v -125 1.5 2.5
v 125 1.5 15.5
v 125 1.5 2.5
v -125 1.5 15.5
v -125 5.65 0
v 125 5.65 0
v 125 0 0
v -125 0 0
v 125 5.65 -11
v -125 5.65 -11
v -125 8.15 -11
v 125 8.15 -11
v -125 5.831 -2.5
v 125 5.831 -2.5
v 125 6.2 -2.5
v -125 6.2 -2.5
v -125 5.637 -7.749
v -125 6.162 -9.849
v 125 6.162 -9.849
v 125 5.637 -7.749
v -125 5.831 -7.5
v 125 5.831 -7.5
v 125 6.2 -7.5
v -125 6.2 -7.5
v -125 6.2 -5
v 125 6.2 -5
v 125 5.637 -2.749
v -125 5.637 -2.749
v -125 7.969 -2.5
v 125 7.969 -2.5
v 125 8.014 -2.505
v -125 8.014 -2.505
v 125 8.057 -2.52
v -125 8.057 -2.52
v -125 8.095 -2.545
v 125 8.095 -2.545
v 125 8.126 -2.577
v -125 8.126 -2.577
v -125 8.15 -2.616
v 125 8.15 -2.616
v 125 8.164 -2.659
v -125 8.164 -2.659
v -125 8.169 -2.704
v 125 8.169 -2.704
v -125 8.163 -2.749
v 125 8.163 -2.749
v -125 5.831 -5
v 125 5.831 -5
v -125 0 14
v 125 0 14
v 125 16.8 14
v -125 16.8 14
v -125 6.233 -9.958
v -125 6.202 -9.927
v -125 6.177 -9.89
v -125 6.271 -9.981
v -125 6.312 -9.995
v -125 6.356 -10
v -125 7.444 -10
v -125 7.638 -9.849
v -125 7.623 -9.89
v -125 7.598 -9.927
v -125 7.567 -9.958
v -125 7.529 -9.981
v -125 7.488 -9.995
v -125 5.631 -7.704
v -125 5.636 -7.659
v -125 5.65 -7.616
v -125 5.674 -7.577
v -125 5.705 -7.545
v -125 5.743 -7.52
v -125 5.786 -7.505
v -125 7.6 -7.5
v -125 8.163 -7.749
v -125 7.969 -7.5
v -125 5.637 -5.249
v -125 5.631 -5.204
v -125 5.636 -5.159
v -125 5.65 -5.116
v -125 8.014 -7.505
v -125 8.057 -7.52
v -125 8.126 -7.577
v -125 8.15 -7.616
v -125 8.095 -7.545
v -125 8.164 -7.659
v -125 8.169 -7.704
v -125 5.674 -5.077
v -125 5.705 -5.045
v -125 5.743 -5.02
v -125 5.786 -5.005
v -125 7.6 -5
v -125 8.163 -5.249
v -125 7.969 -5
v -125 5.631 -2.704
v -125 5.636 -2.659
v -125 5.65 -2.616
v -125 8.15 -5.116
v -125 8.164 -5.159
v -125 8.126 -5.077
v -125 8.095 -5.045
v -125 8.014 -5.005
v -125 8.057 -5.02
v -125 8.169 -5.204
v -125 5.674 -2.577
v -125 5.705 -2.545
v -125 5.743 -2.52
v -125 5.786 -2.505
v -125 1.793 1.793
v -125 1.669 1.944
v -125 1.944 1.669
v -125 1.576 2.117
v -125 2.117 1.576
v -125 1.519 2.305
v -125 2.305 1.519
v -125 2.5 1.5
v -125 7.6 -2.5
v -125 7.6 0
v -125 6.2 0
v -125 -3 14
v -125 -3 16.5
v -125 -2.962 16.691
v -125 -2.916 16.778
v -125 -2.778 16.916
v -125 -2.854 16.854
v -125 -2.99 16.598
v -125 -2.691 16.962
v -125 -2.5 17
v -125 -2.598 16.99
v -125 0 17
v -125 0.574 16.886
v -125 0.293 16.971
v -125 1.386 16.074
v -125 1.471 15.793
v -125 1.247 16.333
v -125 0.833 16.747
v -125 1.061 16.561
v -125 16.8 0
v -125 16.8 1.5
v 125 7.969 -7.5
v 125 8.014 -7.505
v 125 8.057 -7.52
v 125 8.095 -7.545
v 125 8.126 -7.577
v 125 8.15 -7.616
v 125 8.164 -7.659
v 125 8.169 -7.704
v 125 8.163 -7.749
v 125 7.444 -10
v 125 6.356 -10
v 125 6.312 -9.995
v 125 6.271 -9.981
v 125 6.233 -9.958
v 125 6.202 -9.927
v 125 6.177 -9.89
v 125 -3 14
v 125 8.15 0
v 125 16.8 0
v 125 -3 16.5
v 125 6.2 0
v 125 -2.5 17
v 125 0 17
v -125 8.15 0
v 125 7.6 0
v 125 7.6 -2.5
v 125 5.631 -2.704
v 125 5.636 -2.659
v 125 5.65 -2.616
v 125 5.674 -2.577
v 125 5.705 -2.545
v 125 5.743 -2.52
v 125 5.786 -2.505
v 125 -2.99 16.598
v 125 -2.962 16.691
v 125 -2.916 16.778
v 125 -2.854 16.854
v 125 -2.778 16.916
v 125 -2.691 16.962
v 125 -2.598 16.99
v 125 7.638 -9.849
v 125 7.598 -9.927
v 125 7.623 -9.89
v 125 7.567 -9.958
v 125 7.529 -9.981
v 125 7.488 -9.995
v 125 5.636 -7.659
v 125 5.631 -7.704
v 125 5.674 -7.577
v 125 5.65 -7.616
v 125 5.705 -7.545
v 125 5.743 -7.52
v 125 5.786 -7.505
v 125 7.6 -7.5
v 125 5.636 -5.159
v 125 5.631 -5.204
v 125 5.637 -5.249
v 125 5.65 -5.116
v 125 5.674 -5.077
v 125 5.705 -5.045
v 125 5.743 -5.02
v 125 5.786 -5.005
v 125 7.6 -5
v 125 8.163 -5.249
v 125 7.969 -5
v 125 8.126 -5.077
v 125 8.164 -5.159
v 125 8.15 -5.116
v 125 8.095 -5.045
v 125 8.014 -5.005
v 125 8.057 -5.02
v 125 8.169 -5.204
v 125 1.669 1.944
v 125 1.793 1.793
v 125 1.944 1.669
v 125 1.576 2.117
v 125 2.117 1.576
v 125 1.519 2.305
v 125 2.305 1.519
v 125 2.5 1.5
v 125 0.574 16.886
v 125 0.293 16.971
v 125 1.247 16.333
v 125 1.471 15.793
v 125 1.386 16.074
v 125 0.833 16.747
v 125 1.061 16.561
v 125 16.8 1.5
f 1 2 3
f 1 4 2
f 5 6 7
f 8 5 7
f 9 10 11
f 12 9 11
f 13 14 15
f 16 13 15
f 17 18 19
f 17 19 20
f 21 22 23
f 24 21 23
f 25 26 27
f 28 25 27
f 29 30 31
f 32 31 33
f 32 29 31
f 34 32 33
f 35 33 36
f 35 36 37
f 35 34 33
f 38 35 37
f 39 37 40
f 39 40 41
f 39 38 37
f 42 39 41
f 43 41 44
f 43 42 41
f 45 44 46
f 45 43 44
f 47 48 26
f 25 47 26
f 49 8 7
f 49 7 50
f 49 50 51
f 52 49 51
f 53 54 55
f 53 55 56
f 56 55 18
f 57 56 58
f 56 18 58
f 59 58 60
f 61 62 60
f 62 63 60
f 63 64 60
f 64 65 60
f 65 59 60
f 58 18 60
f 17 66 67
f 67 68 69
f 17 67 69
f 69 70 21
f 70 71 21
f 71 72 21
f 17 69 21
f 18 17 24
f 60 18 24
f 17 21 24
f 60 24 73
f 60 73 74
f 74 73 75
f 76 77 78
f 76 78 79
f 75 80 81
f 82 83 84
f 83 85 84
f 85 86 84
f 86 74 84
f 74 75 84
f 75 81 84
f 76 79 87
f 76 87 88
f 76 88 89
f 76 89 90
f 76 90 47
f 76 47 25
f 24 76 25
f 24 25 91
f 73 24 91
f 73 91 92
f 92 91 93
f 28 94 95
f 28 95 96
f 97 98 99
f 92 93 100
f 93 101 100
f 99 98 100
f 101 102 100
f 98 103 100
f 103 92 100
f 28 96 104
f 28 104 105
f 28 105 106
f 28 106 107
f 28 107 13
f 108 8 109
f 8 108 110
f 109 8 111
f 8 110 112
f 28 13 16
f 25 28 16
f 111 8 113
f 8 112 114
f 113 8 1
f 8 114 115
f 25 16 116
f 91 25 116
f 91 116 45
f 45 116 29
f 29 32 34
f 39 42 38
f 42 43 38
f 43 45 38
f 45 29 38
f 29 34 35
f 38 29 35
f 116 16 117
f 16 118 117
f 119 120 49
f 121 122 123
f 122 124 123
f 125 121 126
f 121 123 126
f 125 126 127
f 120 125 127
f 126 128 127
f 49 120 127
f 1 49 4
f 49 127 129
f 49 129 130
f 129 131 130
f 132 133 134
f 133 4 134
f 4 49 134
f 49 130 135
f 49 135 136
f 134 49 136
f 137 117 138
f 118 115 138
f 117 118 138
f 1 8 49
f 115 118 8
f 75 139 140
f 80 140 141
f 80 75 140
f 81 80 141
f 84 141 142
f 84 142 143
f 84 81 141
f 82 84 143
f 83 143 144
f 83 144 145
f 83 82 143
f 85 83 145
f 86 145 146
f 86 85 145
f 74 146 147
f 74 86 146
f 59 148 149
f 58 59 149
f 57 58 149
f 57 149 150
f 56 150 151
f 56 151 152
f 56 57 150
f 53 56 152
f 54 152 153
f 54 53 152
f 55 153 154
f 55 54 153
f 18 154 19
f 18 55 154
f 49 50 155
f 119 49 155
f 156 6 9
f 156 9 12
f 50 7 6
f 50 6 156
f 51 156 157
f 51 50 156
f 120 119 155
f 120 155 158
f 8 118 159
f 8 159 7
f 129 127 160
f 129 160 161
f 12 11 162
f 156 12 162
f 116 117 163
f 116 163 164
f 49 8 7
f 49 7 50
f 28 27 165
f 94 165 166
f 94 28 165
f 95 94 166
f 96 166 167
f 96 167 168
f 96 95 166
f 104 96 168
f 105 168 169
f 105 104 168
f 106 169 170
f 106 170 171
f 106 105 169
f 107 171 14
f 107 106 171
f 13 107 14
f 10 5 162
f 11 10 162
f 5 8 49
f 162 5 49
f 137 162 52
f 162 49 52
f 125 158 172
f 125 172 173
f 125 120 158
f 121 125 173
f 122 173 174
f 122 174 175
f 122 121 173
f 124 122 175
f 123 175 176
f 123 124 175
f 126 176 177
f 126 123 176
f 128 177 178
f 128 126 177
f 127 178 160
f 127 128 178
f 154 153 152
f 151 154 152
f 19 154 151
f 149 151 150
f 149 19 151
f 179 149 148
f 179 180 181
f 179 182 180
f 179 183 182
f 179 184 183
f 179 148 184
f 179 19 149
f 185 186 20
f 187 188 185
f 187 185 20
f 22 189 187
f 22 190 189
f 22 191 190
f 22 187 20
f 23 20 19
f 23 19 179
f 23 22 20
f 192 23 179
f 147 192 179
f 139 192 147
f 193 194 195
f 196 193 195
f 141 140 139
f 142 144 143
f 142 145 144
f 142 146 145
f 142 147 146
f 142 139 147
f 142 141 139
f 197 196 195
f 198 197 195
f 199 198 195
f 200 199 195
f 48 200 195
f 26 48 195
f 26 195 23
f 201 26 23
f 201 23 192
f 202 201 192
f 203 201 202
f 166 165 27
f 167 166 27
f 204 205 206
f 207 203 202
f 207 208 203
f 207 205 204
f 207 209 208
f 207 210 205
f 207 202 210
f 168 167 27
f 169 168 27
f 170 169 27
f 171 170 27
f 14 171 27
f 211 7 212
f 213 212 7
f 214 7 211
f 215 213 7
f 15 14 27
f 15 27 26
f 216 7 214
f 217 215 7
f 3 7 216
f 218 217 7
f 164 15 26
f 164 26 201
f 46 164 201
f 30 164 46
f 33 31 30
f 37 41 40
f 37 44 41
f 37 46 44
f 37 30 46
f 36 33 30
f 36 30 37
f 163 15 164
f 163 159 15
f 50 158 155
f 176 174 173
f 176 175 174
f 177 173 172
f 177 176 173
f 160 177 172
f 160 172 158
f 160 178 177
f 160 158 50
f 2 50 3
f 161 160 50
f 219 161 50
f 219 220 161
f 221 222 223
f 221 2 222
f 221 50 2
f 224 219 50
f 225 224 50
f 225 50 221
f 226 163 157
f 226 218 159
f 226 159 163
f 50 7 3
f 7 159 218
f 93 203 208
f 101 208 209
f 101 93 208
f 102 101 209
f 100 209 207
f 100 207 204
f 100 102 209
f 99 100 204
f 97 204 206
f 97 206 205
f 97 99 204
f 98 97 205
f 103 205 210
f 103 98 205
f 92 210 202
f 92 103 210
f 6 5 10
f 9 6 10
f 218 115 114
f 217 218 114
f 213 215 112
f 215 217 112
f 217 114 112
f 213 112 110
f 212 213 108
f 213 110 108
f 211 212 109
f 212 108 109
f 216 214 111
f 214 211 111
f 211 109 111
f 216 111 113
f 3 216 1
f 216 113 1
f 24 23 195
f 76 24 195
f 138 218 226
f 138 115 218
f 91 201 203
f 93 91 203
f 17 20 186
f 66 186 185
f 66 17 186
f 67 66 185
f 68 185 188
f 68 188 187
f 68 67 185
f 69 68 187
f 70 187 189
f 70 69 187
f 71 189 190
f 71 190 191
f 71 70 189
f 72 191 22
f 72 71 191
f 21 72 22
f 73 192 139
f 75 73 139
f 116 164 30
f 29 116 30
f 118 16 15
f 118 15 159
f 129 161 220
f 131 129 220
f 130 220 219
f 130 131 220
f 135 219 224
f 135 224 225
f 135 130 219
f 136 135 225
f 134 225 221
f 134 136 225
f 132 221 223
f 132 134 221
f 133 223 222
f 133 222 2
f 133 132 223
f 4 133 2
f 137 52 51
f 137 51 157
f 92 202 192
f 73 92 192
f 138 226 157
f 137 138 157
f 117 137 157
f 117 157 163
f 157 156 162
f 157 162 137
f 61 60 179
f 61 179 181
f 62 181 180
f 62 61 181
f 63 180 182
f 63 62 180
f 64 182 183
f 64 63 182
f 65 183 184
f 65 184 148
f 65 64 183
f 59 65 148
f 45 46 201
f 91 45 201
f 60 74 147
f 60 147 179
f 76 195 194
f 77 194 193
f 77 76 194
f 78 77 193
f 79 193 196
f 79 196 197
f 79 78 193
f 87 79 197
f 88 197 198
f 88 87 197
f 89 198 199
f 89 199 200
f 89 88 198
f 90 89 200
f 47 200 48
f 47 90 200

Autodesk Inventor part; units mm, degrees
ref_plane "YZ Plane" through (0, 0, 0) normal (1, 0, 0) x (0, 1, 0)
ref_plane "XZ Plane" through (0, 0, 0) normal (0, 1, 0) x (-1, 0, 0)
ref_plane "XY Plane" through (0, 0, 0) normal (0, 0, 1) x (1, 0, 0)
sketch "Sketch1" plane through (0, 0, 0) normal (1, 0, 0) x (0, 1, 0)
  line L0 (0, 0) -> (0, 14)
  line L1 (0, 14) -> (-3, 14)
  line L2 (-3, 14) -> (-3, 17)
  line L3 (-3, 17) -> (1.5, 17)
  line L4 (1.5, 17) -> (1.5, 1.5)
  line L5 (1.5, 1.5) -> (16.8, 1.5)
  line L6 (16.8, 1.5) -> (16.8, 0)
  line L7 (16.8, 0) -> (7.6, 0)
  line L8 (7.6, 0) -> (7.6, -2.5)
  line L9 (7.6, -2.5) -> (8.225, -2.5)
  line L10 (8.225, -2.5) -> (7.6, -5)
  line L11 (7.6, -5) -> (8.225, -5)
  line L12 (8.225, -5) -> (7.6, -7.5)
  line L13 (7.6, -7.5) -> (8.225, -7.5)
  line L14 (8.225, -7.5) -> (7.6, -10)
  line L15 (7.6, -10) -> (6.2, -10)
  line L16 (6.2, -10) -> (5.575, -7.5)
  line L17 (5.575, -7.5) -> (6.2, -7.5)
  line L18 (6.2, -7.5) -> (5.575, -5)
  line L19 (5.575, -5) -> (6.2, -5)
  line L20 (6.2, -5) -> (5.575, -2.5)
  line L21 (5.575, -2.5) -> (6.2, -2.5)
  line L22 (6.2, -2.5) -> (6.2, 0)
  line L23 (6.2, 0) -> (0, 0)
  dimension "d0" = 3
  dimension "d1" = 3
  dimension "d2" = 1.5
  dimension "d3" = 1.5
  dimension "d4" = 10
  dimension "d5" = 2.65
  dimension "d6" = 19.8
  dimension "d7" = 14
  dimension "d8" = 2.5
  dimension "d9" = 0.625
  dimension "d10" = 9.2
extrude "01_ex1" add sketch "Sketch1" along normal mid plane 250
fillet "01_fillet" radius 1.5 1 edges at (0, 1.5, 17)
fillet "01_fillet" radius 1 1 edges at (0, 1.5, 1.5)
fillet "01_fillet" radius 0.5 1 edges at (0, -3, 17)
fillet "01_fillet" radius 0.2 8 edges at (0, 8.225, -2.5) (0, 5.575, -2.5) (0, 5.575, -5) (0, 8.225, -5) (0, 8.225, -7.5) (0, 5.575, -7.5) (0, 6.2, -10) (0, 7.6, -10)
sketch "Sketch2" plane through (0, 0, 0) normal (1, 0, 0) x (0, 1, 0)
  line L0 (5.65, 0) -> (5.65, -11)
  line L1 (5.65, -11) -> (8.15, -11)
  line L2 (8.15, -11) -> (8.15, 0)
  line L3 (6.3562, -10) -> (7.4438, -10) projected
  line L4 (7.6, 0) -> (16.8, 0) projected
  line L5 (5.65, 0) -> (0, 0)
  line L6 (0, 0) -> (0, 14)
  line L7 (0, 14) -> (16.8, 14)
  line L8 (16.8, 14) -> (16.8, 0)
  line L9 (16.8, 0) -> (8.15, 0)
  line L10 (0, 0) -> (6.2, 0) projected
  line L11 (0, 14) -> (0, 0) projected
  line L12 (16.8, 0) -> (16.8, 1.5) projected
  line L13 (-3, 14) -> (0, 14) projected
  point P0 (6.9, -11)
  point P1 (6.9, -10)
  dimension "d17" = 1
  dimension "d18" = 2.5
extrude "02_ex1" add sketch "Sketch2" along normal mid plane 250 separate body
equation "\"d11\" = Length"
equation "\"d19\" = Length"
equation "\"Length\" = 250"
properties part number "Hafele alu 126_35"
